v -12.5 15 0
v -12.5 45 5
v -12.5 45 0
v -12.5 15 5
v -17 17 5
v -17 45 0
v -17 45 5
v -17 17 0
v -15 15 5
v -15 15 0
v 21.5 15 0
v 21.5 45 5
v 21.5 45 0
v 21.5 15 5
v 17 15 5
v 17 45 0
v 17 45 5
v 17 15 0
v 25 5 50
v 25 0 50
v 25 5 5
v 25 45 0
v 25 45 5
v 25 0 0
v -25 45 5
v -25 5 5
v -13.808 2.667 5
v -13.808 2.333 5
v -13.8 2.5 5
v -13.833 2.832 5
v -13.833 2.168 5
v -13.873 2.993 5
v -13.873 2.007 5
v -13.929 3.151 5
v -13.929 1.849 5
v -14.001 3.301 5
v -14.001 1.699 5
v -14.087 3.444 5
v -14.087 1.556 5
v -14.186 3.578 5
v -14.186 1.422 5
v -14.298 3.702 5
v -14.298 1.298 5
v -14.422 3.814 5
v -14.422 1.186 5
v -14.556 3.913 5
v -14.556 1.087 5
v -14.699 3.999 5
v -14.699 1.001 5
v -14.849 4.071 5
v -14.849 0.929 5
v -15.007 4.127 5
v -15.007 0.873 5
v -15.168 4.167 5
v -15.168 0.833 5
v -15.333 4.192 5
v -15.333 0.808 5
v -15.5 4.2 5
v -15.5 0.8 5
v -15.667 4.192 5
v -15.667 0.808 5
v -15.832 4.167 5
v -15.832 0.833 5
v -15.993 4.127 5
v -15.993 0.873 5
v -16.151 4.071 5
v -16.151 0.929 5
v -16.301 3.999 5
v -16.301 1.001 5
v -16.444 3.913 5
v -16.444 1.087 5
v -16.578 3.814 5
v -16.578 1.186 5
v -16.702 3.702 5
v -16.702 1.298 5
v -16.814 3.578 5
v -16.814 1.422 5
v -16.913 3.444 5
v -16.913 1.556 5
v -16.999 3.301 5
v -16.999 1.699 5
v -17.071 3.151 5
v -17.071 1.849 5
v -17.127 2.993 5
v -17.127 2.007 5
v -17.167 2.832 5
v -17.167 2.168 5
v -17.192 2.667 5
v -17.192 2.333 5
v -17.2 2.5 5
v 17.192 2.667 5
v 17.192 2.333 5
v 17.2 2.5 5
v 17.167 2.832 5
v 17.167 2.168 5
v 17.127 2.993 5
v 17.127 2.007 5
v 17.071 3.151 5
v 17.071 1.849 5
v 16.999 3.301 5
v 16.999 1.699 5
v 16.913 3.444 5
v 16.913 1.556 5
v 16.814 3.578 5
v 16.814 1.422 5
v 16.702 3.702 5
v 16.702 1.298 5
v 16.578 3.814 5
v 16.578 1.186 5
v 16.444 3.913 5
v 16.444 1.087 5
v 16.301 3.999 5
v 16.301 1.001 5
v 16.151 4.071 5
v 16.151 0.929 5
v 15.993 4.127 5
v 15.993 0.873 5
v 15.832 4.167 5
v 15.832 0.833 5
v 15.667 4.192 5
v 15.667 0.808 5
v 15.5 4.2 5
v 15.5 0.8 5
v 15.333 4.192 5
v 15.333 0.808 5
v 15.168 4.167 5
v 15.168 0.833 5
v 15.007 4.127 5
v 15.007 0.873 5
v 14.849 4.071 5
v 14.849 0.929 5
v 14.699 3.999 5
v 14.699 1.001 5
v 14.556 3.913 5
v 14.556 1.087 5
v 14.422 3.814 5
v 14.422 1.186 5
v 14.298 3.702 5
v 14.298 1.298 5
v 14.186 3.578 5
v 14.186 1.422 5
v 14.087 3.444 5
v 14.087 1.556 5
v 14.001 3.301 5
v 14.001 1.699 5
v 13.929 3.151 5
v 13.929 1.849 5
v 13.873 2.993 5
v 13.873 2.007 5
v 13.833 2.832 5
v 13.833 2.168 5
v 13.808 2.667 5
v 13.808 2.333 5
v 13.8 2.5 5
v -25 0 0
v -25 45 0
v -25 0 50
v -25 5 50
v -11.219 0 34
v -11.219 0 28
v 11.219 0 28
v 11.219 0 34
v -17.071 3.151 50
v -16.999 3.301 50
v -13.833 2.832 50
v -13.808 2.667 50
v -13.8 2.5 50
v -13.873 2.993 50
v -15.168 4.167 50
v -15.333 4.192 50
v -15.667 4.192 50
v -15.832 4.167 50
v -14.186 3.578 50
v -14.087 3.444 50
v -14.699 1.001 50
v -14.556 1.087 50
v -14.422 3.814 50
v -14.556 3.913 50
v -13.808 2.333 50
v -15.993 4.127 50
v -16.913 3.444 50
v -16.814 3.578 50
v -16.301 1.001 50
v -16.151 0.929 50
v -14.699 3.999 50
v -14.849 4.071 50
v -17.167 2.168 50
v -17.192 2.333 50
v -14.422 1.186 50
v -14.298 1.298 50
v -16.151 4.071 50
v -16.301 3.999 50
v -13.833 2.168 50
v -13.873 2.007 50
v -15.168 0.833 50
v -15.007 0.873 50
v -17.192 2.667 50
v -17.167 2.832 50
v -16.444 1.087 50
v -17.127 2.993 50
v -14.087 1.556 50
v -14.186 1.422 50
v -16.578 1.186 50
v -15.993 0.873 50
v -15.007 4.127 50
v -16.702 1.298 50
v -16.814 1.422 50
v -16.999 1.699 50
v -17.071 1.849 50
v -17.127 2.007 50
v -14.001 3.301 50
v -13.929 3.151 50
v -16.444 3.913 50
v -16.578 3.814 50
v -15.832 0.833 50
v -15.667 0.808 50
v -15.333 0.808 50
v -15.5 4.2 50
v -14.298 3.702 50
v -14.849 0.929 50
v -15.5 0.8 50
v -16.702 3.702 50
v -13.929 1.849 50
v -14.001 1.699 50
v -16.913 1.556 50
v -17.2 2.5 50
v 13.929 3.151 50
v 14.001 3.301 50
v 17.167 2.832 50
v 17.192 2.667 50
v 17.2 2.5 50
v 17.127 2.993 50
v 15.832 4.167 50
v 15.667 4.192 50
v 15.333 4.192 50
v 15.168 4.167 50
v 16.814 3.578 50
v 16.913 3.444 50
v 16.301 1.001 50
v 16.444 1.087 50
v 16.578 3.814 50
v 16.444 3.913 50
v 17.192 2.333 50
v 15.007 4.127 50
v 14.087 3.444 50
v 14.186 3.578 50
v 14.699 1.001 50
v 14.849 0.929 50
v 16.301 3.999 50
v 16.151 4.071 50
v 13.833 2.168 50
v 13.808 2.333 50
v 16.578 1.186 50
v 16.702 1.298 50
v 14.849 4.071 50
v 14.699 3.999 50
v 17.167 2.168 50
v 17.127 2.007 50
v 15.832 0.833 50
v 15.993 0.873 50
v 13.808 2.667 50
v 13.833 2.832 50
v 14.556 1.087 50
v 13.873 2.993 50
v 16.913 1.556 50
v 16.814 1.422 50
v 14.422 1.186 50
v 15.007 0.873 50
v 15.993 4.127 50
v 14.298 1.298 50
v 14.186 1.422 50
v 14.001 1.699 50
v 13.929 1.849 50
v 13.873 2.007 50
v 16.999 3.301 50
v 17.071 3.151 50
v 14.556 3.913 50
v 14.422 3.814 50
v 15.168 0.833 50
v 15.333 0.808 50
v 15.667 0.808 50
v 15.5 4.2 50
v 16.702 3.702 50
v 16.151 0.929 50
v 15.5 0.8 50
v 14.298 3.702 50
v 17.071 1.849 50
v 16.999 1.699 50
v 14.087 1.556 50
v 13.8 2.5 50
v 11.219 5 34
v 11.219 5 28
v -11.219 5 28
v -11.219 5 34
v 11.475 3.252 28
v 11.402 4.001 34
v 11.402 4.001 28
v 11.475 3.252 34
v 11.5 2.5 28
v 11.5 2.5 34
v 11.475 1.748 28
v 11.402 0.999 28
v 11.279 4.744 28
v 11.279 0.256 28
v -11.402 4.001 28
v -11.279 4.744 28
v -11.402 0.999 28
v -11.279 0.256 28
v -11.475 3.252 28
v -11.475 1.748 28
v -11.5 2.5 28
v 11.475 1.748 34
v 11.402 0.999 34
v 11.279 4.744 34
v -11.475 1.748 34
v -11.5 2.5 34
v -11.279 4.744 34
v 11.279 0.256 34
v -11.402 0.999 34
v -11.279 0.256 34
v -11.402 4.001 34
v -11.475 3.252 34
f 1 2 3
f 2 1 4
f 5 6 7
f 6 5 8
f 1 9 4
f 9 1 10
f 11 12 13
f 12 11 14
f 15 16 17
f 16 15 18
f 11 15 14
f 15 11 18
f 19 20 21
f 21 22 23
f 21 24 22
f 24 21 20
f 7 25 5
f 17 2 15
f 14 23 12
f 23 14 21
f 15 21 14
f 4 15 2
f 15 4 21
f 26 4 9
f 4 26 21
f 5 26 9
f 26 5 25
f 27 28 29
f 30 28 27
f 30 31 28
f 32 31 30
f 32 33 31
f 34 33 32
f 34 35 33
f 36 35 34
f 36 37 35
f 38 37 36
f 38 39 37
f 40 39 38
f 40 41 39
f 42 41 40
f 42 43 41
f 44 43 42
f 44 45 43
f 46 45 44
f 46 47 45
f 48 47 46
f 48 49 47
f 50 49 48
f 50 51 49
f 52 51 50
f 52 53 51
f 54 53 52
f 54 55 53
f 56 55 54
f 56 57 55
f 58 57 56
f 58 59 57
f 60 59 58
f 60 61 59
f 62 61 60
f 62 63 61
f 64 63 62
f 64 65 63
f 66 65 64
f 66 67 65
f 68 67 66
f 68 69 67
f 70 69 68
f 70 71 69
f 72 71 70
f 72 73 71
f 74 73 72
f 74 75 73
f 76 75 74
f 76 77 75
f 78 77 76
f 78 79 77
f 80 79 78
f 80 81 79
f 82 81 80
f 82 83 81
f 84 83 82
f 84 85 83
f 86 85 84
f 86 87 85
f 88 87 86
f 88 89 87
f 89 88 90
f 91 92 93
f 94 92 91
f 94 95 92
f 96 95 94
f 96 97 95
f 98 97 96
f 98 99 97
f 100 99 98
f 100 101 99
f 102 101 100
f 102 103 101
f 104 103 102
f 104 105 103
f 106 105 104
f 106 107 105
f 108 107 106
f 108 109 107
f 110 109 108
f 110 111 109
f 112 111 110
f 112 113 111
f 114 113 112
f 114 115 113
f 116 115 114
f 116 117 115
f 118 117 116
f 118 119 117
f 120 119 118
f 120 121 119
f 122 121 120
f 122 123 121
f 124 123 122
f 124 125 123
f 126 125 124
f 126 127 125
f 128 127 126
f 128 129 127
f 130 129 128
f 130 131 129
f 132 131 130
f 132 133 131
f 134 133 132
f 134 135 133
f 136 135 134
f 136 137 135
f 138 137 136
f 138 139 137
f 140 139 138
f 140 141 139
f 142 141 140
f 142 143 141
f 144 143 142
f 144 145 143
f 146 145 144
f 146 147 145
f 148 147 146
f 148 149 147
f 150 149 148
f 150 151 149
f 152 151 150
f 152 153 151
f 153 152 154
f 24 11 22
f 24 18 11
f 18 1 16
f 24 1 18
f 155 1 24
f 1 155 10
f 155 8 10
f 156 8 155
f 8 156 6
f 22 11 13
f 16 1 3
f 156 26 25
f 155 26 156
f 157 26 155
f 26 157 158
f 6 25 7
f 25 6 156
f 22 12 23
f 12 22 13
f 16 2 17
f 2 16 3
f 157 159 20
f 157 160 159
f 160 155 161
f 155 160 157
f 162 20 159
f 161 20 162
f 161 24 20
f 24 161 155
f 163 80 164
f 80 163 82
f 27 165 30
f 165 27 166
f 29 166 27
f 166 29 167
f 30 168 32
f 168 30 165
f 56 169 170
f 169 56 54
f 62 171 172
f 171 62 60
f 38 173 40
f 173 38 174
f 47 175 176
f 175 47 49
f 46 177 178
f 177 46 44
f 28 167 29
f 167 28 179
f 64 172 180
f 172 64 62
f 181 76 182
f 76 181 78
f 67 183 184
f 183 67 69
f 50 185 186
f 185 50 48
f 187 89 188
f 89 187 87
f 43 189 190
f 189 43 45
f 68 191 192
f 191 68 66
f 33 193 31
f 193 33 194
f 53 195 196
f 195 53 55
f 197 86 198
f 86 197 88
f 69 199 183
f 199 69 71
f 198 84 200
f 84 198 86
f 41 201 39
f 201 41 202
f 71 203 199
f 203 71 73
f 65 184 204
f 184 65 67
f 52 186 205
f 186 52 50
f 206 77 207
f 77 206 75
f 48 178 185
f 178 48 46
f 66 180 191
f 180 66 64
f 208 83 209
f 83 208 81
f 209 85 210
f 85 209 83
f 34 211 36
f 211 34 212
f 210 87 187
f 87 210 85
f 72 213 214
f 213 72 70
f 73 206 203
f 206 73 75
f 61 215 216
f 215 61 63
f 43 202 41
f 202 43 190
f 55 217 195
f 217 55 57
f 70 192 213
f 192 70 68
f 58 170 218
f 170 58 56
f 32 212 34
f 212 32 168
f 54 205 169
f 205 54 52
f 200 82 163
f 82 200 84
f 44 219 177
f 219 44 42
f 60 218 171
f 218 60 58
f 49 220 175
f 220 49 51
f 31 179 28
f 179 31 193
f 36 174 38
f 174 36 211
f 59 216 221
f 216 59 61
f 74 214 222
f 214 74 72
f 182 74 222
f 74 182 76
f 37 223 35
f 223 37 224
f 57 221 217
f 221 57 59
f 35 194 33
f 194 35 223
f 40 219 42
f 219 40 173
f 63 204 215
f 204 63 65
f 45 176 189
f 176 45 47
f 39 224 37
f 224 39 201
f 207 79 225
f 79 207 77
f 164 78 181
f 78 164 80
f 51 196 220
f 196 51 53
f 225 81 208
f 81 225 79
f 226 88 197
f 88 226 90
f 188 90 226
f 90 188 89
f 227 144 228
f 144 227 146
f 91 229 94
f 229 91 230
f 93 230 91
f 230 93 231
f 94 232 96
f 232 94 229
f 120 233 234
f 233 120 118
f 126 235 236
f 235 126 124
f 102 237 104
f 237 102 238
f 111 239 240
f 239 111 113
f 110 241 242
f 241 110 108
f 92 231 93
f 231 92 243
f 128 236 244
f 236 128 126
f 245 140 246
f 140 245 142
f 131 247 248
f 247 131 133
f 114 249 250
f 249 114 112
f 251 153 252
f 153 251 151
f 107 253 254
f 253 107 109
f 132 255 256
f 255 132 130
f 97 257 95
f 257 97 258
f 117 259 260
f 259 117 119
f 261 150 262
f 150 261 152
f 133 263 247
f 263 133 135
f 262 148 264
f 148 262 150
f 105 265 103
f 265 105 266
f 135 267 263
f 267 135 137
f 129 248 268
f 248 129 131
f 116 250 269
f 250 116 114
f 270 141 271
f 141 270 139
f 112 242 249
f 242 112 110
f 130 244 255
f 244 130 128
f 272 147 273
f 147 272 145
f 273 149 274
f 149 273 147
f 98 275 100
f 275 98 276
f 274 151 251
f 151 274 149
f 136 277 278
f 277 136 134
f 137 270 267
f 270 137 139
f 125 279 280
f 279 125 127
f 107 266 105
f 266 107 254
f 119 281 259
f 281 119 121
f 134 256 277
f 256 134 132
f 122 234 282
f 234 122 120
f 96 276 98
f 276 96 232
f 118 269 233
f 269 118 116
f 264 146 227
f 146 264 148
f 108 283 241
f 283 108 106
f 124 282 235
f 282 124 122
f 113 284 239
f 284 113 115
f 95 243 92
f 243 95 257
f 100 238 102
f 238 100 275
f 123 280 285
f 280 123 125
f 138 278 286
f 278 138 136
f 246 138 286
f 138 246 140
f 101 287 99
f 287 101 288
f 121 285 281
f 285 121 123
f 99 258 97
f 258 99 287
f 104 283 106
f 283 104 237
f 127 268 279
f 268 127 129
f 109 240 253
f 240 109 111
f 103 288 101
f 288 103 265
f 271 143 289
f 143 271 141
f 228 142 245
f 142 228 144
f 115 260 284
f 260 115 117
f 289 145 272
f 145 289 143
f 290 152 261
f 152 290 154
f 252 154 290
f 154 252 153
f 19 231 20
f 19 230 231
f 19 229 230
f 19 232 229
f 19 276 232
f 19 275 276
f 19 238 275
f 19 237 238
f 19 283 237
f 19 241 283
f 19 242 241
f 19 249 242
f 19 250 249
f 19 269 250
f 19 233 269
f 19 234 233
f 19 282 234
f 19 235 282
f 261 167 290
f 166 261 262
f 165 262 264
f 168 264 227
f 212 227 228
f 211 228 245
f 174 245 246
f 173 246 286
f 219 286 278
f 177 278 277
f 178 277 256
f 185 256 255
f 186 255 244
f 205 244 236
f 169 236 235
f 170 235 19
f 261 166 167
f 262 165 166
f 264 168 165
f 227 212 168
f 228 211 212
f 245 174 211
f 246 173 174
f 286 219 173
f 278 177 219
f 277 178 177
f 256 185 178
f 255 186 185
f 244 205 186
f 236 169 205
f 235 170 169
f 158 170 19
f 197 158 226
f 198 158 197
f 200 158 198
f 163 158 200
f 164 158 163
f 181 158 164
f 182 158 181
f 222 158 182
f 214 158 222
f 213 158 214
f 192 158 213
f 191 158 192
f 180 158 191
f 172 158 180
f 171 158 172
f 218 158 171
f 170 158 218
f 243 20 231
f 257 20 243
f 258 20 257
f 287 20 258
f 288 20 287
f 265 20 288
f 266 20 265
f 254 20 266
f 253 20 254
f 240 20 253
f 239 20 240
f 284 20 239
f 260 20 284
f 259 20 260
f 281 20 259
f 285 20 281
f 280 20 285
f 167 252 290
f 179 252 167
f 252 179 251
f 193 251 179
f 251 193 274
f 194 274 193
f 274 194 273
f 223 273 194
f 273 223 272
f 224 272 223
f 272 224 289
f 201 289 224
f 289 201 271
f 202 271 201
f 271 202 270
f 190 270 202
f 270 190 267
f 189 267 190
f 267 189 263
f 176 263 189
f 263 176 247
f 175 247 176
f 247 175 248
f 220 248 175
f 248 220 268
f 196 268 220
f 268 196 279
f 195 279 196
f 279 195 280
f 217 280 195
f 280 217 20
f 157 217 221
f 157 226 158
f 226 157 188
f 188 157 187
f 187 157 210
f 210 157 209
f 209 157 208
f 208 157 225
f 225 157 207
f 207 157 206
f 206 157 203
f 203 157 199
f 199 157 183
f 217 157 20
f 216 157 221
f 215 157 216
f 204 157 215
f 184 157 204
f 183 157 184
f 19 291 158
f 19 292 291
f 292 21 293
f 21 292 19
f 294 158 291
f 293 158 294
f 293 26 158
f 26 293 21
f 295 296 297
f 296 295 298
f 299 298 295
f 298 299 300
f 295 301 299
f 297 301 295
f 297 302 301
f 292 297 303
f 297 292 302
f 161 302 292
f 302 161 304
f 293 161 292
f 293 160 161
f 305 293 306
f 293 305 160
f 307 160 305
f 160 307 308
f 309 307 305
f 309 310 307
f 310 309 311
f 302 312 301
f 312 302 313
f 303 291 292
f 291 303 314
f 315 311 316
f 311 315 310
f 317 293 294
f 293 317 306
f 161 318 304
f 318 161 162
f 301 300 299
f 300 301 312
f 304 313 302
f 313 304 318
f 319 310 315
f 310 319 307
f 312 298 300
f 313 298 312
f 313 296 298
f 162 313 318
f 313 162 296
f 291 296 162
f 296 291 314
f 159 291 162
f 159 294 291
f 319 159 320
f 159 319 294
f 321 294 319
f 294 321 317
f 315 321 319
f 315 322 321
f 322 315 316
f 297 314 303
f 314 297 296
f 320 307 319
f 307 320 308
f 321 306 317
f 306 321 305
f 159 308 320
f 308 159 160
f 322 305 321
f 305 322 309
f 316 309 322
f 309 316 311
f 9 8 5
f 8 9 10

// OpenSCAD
// L-shaped mounting bracket for NEMA 17 stepper motor (e.g. syringe pump)
// Print orientation: base plate on bed, vertical plate builds up in +Z

// ---------- Parameters ----------
base_x0      = -25;   // base plate x start
base_x1      = 25;    // base plate x end
base_y0      = 0;     // base plate y start
base_y1      = 45;    // base plate y end
base_z       = 5;     // base plate thickness

motor_x0     = -25;   // motor plate x start
motor_x1     = 25;    // motor plate x end
motor_y      = 5;     // motor plate y end (thickness)
motor_z      = 50;    // motor plate height

boss_hole    = 23;    // motor centring boss hole diameter
boss_x       = 0;     // boss hole x centre
boss_z       = 28;    // boss hole z centre

screw_hole   = 3.4;   // M3 screw hole diameter
screw_n      = 4;     // number of screw holes
screw_pitch  = 31;    // square pattern side length

gusset_t     = 5;     // gusset thickness (x direction)
gusset_x0    = -25;   // left gusset x start
gusset_x1    = -20;   // left gusset x end
gusset_y     = 20;    // gusset leg along +Y
gusset_z     = 20;    // gusset leg along +Z

eps          = 0.5;   // cutter overshoot past faces

$fn = 96;

// ---------- Model ----------
union() {
    // Base plate with M4 through-holes
    difference() {
        translate([base_x0, base_y0, 0])
            cube([base_x1 - base_x0, base_y1 - base_y0, base_z]);
        for (sx = [-17, 17])
            translate([sx, base_y1 - 30, -eps])
                cube([4.5, 30 + 2*eps, base_z + 2*eps]);
    }

    // Vertical motor plate with boss hole and M3 screw holes
    difference() {
        translate([motor_x0, 0, 0])
            cube([motor_x1 - motor_x0, motor_y, motor_z]);
        translate([boss_x, motor_y/2, boss_z])
            cylinder(d = boss_hole, h = motor_y + 2*eps, $fn = 96);
        for (i = [0 : screw_n - 1]) {
            x = (i - (screw_n - 1)/2) * screw_pitch;
            translate([x, motor_y/2, 0])
                cylinder(d = screw_hole, h = motor_z + 2*eps, $fn = 64);
        }
    }

    // Triangular gussets, flush with left and right edges
    for (sx = [gusset_x0, gusset_x1])
        translate([sx, 0, 0])
            linear_extrude(height = gusset_t)
                polygon([[0, 0], [gusset_y, 0], [0, gusset_z]]);
}
